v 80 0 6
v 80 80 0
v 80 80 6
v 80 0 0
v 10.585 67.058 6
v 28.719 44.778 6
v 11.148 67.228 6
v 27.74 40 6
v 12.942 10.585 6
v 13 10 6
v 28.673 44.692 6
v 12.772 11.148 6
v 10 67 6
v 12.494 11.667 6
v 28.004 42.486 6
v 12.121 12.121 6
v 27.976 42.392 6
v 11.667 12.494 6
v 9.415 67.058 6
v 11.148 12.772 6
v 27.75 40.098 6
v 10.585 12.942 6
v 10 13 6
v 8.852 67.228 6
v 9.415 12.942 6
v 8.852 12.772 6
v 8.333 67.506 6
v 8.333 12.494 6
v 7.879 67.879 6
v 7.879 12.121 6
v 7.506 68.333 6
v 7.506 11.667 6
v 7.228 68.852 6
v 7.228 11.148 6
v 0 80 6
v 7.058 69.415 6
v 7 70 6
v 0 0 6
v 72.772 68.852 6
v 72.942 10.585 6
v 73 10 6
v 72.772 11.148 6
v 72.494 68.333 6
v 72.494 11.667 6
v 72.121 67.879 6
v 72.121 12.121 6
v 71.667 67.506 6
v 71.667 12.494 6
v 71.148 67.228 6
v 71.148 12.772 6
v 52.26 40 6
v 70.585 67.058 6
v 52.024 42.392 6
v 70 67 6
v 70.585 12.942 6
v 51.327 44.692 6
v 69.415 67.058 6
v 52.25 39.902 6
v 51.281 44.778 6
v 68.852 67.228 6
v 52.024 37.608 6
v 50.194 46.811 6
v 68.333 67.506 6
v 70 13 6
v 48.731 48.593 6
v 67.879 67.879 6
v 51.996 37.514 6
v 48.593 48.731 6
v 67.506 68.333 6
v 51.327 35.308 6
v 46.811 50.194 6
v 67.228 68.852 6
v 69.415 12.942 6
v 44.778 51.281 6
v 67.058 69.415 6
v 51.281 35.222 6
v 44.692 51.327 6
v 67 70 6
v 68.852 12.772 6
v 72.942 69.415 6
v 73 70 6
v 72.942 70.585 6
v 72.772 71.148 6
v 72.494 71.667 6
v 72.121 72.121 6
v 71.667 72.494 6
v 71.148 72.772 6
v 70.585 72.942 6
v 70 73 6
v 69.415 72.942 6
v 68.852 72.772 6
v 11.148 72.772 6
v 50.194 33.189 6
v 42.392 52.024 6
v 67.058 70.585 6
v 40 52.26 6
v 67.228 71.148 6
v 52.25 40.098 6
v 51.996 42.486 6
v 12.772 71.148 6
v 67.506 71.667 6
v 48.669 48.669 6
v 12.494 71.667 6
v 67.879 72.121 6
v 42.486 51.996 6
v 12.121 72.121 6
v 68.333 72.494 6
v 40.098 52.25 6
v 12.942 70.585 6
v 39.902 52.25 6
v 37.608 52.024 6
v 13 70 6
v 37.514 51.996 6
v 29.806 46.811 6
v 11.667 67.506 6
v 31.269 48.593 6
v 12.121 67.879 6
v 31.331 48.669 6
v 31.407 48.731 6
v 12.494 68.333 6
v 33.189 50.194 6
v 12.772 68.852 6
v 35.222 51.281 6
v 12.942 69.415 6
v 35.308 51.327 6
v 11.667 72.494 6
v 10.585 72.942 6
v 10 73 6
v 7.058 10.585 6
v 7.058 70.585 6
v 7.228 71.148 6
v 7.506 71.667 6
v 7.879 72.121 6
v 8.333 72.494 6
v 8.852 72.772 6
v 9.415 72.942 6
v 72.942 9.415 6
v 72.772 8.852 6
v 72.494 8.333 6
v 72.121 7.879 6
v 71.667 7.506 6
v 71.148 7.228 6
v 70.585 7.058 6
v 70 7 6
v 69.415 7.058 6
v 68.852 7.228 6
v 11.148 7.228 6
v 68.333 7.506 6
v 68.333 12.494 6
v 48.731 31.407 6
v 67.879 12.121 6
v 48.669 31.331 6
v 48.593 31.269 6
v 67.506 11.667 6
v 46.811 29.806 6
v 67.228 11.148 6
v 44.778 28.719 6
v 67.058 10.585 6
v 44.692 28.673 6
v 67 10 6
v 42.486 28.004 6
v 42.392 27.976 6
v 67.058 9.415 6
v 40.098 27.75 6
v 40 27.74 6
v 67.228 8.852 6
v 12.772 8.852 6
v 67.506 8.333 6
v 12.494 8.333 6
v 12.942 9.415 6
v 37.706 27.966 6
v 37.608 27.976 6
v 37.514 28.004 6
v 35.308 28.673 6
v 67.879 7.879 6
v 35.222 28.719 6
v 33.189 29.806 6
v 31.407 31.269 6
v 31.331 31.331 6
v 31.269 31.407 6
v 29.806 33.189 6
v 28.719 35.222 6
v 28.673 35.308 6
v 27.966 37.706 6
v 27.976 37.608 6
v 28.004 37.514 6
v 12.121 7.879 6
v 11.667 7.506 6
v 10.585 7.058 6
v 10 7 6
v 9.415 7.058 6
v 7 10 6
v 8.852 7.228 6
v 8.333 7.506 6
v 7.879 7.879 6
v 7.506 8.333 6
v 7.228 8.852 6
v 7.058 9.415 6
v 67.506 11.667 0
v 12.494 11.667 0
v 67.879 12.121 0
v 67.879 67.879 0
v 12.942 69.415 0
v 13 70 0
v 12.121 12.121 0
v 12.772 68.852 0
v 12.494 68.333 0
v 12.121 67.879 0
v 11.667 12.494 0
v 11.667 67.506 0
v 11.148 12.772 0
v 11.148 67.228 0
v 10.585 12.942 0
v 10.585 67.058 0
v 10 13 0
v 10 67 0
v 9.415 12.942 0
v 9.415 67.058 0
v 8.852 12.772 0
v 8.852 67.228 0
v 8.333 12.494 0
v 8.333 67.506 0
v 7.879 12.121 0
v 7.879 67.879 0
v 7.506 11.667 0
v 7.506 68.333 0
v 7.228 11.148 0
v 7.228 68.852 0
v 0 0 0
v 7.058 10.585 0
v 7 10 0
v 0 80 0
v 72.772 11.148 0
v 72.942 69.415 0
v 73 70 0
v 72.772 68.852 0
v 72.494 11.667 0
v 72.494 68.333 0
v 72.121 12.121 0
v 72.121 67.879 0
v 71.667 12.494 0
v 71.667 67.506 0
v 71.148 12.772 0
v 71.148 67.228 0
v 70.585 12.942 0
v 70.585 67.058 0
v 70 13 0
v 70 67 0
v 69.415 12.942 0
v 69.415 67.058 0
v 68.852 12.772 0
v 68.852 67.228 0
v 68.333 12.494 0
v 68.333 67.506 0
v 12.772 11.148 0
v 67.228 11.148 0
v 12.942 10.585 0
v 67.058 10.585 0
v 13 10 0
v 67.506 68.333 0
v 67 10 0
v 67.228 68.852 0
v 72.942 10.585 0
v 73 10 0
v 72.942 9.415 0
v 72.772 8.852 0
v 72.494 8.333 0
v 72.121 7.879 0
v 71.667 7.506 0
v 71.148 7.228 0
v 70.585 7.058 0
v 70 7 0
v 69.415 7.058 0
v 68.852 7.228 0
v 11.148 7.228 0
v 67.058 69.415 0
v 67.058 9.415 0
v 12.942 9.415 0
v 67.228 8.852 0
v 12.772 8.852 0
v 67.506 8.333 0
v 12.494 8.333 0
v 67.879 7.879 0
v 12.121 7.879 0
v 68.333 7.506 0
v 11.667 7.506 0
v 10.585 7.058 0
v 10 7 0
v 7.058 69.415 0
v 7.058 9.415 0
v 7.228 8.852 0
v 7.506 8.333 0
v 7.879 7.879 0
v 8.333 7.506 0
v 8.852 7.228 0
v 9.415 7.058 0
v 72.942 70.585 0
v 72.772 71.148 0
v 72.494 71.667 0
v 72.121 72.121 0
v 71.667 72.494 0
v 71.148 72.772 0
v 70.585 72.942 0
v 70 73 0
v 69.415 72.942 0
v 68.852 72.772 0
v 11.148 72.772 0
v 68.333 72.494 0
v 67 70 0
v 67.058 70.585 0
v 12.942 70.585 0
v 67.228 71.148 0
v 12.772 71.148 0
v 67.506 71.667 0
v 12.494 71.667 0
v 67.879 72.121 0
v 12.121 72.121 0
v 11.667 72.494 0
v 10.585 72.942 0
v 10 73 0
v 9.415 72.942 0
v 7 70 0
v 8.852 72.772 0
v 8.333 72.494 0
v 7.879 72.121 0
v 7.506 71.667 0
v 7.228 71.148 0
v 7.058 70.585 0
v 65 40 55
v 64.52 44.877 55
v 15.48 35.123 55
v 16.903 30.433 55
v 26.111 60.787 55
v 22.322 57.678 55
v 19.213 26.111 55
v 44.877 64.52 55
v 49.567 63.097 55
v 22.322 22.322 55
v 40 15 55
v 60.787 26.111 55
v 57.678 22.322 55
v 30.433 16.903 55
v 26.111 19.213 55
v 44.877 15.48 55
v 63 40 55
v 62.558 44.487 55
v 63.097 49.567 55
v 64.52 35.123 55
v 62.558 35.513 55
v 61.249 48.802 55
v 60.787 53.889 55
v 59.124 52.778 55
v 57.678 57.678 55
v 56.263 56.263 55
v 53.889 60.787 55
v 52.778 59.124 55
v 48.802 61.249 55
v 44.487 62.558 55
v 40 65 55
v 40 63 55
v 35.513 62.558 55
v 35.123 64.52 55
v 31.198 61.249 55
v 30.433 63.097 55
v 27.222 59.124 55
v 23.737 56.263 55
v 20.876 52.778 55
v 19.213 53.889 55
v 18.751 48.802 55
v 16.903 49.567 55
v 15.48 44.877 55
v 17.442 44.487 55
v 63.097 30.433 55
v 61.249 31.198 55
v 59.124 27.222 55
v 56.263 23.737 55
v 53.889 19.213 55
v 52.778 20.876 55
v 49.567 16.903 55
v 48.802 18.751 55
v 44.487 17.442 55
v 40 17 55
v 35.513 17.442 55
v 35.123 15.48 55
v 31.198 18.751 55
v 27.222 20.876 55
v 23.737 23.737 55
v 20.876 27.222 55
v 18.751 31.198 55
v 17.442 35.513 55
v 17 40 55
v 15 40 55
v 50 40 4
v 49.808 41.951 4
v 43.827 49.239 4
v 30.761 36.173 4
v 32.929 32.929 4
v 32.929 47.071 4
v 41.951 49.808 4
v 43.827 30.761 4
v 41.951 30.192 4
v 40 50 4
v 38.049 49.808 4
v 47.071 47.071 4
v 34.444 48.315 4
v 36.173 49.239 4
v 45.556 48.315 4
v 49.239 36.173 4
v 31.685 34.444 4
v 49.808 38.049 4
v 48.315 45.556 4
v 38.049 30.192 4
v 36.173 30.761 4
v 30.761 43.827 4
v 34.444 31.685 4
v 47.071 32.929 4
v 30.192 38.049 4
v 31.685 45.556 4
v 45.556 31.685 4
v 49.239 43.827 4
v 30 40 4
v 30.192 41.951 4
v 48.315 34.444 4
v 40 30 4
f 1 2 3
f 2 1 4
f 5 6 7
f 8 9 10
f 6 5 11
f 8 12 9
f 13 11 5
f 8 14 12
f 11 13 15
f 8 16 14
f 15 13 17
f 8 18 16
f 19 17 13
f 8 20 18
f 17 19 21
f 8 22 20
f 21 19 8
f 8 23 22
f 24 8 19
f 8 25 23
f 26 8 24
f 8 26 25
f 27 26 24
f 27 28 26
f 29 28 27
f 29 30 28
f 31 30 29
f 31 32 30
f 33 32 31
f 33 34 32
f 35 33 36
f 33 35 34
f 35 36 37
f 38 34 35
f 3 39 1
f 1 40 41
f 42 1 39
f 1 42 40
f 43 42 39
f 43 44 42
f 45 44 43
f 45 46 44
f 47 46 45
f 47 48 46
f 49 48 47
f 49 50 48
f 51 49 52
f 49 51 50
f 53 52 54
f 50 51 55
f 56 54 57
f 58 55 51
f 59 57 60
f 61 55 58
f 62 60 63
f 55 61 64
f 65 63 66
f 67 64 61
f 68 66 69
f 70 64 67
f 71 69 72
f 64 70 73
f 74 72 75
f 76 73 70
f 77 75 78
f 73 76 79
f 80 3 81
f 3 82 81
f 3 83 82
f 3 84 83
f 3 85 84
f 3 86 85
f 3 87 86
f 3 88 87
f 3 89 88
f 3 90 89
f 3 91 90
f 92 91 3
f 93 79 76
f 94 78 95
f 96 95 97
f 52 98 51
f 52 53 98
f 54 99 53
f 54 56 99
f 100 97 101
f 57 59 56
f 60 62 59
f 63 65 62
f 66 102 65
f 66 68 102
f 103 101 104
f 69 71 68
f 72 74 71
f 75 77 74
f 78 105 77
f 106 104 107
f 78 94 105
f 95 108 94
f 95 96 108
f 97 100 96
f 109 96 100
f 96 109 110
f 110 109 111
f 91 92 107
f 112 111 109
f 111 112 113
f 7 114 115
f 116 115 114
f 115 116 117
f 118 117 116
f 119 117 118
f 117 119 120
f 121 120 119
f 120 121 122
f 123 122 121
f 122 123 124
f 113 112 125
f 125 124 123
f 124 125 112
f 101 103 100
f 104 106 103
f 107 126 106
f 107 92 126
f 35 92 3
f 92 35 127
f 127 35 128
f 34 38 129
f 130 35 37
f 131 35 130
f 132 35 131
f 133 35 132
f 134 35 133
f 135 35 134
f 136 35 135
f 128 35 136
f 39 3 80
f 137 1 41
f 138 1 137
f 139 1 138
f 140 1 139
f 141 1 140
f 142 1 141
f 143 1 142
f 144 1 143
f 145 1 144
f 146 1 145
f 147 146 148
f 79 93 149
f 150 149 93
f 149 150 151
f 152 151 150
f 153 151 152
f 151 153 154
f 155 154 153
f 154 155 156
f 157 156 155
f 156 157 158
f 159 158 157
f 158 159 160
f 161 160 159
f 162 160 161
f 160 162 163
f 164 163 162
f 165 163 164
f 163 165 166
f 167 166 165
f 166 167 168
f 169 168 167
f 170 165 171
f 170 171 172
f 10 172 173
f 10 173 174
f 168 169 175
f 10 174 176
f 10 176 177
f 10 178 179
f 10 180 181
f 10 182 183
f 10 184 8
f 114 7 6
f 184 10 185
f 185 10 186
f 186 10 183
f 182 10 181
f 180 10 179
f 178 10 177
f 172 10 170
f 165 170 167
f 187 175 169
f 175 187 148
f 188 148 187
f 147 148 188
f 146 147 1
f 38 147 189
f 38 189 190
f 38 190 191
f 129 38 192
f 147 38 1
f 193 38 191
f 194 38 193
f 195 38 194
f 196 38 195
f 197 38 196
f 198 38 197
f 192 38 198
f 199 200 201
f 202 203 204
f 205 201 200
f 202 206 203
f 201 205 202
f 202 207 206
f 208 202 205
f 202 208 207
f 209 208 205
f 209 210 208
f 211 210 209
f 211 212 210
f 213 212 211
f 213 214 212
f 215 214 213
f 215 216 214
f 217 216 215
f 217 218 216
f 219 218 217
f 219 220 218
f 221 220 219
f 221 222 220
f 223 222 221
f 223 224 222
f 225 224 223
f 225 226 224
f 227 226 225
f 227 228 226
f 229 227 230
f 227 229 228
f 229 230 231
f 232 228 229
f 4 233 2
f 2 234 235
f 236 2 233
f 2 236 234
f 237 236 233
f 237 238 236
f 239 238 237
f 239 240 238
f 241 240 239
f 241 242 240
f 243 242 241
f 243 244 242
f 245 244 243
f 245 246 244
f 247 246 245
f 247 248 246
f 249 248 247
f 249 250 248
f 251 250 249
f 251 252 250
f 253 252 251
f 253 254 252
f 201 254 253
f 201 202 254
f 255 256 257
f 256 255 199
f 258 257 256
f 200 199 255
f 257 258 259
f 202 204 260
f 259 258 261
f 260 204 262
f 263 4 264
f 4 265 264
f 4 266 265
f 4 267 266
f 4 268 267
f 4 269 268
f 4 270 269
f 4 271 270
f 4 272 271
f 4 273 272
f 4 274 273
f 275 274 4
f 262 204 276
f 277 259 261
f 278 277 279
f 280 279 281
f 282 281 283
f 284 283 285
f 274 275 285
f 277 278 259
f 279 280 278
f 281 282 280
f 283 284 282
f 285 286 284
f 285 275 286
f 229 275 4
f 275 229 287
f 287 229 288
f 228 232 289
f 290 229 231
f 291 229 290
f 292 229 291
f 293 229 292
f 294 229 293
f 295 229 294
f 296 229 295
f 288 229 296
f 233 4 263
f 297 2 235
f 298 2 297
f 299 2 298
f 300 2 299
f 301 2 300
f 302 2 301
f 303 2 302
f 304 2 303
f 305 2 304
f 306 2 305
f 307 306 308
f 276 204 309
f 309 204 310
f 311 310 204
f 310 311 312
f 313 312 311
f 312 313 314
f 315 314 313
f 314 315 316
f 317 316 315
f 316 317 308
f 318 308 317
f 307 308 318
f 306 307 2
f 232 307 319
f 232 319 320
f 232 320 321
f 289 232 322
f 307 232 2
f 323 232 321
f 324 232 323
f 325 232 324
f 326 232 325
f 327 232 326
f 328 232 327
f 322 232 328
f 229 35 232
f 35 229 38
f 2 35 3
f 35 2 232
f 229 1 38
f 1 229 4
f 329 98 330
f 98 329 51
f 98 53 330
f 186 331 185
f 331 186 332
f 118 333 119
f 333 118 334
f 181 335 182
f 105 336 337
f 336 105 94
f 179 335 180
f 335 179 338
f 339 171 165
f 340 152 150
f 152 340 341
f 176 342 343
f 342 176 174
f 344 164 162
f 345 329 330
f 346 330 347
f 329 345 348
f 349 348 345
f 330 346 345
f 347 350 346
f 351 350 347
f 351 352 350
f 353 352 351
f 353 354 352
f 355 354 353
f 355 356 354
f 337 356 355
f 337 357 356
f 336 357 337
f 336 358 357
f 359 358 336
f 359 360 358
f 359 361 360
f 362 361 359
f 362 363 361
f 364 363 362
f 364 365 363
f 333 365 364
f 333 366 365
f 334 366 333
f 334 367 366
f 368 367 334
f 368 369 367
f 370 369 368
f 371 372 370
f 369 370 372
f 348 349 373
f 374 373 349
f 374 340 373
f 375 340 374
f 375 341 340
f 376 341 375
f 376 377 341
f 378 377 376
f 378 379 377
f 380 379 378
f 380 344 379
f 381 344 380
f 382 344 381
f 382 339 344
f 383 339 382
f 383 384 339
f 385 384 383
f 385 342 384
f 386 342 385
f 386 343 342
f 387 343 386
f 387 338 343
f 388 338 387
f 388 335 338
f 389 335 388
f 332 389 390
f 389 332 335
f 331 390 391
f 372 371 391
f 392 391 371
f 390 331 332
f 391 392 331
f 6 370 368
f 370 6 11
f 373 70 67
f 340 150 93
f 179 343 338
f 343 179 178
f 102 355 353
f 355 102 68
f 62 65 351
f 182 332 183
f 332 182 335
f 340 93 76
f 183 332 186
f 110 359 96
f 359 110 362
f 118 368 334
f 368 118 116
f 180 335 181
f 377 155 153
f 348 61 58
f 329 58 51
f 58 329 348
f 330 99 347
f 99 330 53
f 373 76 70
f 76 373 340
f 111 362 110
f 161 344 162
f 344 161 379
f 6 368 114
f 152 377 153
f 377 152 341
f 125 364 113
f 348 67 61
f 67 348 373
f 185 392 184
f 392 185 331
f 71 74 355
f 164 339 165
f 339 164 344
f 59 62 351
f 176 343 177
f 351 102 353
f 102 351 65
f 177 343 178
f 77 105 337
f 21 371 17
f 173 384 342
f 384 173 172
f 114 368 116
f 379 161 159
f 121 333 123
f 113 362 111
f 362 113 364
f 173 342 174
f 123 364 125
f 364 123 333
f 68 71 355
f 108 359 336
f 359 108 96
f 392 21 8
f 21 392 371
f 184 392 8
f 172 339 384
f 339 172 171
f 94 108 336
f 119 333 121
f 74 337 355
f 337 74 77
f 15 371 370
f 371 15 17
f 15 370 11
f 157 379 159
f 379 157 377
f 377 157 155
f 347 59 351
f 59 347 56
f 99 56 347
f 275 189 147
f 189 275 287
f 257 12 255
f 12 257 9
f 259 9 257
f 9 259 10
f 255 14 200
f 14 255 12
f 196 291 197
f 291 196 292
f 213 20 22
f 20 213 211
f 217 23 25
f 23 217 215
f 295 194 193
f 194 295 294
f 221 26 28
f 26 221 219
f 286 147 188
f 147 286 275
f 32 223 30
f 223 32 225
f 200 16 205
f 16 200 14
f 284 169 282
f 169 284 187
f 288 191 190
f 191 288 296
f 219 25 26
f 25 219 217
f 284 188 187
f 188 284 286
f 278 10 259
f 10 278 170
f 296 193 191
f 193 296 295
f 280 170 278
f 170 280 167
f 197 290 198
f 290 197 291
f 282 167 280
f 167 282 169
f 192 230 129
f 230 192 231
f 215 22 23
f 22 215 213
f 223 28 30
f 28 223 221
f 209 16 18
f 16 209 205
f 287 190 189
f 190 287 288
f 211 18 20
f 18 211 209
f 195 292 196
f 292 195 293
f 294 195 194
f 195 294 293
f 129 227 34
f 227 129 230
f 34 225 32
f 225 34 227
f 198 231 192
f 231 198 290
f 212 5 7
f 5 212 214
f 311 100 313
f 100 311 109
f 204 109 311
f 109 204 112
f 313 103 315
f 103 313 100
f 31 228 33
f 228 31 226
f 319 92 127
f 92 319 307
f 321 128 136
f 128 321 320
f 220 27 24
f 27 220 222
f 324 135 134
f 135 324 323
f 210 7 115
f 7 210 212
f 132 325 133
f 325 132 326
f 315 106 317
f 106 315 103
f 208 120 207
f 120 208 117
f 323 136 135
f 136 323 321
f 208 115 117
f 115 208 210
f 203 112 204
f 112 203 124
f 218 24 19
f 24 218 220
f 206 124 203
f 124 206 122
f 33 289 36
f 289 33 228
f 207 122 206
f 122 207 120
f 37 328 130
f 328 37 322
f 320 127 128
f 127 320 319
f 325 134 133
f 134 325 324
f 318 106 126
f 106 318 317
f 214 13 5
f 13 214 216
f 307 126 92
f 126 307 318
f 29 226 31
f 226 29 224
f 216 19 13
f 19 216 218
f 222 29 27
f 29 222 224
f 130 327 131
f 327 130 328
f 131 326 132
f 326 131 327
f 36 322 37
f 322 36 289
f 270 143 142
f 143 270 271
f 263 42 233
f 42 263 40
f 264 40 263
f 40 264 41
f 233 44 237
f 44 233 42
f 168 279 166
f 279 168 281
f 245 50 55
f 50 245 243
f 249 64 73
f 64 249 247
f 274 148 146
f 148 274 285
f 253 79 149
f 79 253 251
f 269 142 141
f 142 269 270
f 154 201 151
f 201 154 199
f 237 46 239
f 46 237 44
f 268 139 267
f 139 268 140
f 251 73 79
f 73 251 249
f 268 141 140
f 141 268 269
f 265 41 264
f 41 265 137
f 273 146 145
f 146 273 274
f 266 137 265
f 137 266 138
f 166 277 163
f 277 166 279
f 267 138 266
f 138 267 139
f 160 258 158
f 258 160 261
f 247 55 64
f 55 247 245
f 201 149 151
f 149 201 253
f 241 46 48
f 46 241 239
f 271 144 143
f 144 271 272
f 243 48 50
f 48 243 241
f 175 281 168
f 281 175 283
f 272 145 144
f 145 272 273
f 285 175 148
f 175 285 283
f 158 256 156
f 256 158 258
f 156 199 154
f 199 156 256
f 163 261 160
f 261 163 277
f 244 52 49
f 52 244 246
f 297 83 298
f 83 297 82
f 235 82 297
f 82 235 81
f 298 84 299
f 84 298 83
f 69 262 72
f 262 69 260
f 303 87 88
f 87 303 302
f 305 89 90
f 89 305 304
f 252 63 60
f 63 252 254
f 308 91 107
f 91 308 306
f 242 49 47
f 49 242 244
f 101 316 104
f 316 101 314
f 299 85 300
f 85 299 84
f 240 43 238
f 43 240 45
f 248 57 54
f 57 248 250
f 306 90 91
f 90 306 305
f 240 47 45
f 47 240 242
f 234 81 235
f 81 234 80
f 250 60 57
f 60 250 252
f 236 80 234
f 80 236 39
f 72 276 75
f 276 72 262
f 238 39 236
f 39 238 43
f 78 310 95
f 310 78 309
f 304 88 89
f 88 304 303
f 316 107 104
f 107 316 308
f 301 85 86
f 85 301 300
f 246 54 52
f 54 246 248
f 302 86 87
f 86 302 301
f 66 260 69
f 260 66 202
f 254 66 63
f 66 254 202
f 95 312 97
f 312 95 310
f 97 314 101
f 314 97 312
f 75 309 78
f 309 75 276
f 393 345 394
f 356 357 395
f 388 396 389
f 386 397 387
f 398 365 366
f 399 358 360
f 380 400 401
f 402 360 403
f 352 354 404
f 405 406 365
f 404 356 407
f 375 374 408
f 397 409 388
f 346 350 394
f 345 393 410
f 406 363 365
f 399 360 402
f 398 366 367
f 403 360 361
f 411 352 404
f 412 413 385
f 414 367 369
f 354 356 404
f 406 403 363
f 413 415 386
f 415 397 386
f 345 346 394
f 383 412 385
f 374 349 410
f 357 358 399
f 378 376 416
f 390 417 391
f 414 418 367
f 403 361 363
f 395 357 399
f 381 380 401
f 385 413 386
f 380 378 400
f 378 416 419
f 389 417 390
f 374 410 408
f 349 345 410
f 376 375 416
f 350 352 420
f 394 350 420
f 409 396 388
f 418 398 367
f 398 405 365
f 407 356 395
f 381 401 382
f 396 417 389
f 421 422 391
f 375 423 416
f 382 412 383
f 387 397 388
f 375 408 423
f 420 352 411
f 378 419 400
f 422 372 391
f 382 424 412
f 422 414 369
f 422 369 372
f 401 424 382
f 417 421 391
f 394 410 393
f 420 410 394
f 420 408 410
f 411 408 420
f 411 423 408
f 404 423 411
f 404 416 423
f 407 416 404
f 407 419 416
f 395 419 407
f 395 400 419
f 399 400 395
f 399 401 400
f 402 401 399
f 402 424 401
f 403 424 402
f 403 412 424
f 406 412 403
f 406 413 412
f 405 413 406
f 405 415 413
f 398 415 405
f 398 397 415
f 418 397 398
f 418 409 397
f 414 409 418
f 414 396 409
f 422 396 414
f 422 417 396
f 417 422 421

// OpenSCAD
$fn = 32;

// ----------------------------------------------------------------------
// Hopper: flanged with square flange
// ----------------------------------------------------------------------

// --- parameters (mm) ---
fl = 80;                  // flange side, X and Y
fl_t = 6;                 // flange thickness
cone_h = 50;              // cone height above the flange
top_d = 50;               // cone mouth diameter
bot_d = 24;               // cone spout diameter
wall = 2;                 // cone wall thickness
hole_r = 3;               // flange hole radius
hole_in = 10;             // hole inset from the corners

bore_d = bot_d - 2 * wall;  // spout bore diameter
total_h = fl_t + cone_h - 1;  // overall height

difference() {
  union() {
    cube([fl, fl, fl_t]);
    translate([fl / 2, fl / 2, fl_t - 1])
      cylinder(h = cone_h, d1 = bot_d, d2 = top_d);
  }
  translate([fl / 2, fl / 2, fl_t - 2])
    cylinder(h = cone_h + 1, d1 = bore_d, d2 = top_d - 2 * wall);
  for (sx = [0, 1], sy = [0, 1])
    translate([sx ? fl - hole_in : hole_in,
               sy ? fl - hole_in : hole_in, -1])
      cylinder(r = hole_r, h = fl_t + 2);
}
